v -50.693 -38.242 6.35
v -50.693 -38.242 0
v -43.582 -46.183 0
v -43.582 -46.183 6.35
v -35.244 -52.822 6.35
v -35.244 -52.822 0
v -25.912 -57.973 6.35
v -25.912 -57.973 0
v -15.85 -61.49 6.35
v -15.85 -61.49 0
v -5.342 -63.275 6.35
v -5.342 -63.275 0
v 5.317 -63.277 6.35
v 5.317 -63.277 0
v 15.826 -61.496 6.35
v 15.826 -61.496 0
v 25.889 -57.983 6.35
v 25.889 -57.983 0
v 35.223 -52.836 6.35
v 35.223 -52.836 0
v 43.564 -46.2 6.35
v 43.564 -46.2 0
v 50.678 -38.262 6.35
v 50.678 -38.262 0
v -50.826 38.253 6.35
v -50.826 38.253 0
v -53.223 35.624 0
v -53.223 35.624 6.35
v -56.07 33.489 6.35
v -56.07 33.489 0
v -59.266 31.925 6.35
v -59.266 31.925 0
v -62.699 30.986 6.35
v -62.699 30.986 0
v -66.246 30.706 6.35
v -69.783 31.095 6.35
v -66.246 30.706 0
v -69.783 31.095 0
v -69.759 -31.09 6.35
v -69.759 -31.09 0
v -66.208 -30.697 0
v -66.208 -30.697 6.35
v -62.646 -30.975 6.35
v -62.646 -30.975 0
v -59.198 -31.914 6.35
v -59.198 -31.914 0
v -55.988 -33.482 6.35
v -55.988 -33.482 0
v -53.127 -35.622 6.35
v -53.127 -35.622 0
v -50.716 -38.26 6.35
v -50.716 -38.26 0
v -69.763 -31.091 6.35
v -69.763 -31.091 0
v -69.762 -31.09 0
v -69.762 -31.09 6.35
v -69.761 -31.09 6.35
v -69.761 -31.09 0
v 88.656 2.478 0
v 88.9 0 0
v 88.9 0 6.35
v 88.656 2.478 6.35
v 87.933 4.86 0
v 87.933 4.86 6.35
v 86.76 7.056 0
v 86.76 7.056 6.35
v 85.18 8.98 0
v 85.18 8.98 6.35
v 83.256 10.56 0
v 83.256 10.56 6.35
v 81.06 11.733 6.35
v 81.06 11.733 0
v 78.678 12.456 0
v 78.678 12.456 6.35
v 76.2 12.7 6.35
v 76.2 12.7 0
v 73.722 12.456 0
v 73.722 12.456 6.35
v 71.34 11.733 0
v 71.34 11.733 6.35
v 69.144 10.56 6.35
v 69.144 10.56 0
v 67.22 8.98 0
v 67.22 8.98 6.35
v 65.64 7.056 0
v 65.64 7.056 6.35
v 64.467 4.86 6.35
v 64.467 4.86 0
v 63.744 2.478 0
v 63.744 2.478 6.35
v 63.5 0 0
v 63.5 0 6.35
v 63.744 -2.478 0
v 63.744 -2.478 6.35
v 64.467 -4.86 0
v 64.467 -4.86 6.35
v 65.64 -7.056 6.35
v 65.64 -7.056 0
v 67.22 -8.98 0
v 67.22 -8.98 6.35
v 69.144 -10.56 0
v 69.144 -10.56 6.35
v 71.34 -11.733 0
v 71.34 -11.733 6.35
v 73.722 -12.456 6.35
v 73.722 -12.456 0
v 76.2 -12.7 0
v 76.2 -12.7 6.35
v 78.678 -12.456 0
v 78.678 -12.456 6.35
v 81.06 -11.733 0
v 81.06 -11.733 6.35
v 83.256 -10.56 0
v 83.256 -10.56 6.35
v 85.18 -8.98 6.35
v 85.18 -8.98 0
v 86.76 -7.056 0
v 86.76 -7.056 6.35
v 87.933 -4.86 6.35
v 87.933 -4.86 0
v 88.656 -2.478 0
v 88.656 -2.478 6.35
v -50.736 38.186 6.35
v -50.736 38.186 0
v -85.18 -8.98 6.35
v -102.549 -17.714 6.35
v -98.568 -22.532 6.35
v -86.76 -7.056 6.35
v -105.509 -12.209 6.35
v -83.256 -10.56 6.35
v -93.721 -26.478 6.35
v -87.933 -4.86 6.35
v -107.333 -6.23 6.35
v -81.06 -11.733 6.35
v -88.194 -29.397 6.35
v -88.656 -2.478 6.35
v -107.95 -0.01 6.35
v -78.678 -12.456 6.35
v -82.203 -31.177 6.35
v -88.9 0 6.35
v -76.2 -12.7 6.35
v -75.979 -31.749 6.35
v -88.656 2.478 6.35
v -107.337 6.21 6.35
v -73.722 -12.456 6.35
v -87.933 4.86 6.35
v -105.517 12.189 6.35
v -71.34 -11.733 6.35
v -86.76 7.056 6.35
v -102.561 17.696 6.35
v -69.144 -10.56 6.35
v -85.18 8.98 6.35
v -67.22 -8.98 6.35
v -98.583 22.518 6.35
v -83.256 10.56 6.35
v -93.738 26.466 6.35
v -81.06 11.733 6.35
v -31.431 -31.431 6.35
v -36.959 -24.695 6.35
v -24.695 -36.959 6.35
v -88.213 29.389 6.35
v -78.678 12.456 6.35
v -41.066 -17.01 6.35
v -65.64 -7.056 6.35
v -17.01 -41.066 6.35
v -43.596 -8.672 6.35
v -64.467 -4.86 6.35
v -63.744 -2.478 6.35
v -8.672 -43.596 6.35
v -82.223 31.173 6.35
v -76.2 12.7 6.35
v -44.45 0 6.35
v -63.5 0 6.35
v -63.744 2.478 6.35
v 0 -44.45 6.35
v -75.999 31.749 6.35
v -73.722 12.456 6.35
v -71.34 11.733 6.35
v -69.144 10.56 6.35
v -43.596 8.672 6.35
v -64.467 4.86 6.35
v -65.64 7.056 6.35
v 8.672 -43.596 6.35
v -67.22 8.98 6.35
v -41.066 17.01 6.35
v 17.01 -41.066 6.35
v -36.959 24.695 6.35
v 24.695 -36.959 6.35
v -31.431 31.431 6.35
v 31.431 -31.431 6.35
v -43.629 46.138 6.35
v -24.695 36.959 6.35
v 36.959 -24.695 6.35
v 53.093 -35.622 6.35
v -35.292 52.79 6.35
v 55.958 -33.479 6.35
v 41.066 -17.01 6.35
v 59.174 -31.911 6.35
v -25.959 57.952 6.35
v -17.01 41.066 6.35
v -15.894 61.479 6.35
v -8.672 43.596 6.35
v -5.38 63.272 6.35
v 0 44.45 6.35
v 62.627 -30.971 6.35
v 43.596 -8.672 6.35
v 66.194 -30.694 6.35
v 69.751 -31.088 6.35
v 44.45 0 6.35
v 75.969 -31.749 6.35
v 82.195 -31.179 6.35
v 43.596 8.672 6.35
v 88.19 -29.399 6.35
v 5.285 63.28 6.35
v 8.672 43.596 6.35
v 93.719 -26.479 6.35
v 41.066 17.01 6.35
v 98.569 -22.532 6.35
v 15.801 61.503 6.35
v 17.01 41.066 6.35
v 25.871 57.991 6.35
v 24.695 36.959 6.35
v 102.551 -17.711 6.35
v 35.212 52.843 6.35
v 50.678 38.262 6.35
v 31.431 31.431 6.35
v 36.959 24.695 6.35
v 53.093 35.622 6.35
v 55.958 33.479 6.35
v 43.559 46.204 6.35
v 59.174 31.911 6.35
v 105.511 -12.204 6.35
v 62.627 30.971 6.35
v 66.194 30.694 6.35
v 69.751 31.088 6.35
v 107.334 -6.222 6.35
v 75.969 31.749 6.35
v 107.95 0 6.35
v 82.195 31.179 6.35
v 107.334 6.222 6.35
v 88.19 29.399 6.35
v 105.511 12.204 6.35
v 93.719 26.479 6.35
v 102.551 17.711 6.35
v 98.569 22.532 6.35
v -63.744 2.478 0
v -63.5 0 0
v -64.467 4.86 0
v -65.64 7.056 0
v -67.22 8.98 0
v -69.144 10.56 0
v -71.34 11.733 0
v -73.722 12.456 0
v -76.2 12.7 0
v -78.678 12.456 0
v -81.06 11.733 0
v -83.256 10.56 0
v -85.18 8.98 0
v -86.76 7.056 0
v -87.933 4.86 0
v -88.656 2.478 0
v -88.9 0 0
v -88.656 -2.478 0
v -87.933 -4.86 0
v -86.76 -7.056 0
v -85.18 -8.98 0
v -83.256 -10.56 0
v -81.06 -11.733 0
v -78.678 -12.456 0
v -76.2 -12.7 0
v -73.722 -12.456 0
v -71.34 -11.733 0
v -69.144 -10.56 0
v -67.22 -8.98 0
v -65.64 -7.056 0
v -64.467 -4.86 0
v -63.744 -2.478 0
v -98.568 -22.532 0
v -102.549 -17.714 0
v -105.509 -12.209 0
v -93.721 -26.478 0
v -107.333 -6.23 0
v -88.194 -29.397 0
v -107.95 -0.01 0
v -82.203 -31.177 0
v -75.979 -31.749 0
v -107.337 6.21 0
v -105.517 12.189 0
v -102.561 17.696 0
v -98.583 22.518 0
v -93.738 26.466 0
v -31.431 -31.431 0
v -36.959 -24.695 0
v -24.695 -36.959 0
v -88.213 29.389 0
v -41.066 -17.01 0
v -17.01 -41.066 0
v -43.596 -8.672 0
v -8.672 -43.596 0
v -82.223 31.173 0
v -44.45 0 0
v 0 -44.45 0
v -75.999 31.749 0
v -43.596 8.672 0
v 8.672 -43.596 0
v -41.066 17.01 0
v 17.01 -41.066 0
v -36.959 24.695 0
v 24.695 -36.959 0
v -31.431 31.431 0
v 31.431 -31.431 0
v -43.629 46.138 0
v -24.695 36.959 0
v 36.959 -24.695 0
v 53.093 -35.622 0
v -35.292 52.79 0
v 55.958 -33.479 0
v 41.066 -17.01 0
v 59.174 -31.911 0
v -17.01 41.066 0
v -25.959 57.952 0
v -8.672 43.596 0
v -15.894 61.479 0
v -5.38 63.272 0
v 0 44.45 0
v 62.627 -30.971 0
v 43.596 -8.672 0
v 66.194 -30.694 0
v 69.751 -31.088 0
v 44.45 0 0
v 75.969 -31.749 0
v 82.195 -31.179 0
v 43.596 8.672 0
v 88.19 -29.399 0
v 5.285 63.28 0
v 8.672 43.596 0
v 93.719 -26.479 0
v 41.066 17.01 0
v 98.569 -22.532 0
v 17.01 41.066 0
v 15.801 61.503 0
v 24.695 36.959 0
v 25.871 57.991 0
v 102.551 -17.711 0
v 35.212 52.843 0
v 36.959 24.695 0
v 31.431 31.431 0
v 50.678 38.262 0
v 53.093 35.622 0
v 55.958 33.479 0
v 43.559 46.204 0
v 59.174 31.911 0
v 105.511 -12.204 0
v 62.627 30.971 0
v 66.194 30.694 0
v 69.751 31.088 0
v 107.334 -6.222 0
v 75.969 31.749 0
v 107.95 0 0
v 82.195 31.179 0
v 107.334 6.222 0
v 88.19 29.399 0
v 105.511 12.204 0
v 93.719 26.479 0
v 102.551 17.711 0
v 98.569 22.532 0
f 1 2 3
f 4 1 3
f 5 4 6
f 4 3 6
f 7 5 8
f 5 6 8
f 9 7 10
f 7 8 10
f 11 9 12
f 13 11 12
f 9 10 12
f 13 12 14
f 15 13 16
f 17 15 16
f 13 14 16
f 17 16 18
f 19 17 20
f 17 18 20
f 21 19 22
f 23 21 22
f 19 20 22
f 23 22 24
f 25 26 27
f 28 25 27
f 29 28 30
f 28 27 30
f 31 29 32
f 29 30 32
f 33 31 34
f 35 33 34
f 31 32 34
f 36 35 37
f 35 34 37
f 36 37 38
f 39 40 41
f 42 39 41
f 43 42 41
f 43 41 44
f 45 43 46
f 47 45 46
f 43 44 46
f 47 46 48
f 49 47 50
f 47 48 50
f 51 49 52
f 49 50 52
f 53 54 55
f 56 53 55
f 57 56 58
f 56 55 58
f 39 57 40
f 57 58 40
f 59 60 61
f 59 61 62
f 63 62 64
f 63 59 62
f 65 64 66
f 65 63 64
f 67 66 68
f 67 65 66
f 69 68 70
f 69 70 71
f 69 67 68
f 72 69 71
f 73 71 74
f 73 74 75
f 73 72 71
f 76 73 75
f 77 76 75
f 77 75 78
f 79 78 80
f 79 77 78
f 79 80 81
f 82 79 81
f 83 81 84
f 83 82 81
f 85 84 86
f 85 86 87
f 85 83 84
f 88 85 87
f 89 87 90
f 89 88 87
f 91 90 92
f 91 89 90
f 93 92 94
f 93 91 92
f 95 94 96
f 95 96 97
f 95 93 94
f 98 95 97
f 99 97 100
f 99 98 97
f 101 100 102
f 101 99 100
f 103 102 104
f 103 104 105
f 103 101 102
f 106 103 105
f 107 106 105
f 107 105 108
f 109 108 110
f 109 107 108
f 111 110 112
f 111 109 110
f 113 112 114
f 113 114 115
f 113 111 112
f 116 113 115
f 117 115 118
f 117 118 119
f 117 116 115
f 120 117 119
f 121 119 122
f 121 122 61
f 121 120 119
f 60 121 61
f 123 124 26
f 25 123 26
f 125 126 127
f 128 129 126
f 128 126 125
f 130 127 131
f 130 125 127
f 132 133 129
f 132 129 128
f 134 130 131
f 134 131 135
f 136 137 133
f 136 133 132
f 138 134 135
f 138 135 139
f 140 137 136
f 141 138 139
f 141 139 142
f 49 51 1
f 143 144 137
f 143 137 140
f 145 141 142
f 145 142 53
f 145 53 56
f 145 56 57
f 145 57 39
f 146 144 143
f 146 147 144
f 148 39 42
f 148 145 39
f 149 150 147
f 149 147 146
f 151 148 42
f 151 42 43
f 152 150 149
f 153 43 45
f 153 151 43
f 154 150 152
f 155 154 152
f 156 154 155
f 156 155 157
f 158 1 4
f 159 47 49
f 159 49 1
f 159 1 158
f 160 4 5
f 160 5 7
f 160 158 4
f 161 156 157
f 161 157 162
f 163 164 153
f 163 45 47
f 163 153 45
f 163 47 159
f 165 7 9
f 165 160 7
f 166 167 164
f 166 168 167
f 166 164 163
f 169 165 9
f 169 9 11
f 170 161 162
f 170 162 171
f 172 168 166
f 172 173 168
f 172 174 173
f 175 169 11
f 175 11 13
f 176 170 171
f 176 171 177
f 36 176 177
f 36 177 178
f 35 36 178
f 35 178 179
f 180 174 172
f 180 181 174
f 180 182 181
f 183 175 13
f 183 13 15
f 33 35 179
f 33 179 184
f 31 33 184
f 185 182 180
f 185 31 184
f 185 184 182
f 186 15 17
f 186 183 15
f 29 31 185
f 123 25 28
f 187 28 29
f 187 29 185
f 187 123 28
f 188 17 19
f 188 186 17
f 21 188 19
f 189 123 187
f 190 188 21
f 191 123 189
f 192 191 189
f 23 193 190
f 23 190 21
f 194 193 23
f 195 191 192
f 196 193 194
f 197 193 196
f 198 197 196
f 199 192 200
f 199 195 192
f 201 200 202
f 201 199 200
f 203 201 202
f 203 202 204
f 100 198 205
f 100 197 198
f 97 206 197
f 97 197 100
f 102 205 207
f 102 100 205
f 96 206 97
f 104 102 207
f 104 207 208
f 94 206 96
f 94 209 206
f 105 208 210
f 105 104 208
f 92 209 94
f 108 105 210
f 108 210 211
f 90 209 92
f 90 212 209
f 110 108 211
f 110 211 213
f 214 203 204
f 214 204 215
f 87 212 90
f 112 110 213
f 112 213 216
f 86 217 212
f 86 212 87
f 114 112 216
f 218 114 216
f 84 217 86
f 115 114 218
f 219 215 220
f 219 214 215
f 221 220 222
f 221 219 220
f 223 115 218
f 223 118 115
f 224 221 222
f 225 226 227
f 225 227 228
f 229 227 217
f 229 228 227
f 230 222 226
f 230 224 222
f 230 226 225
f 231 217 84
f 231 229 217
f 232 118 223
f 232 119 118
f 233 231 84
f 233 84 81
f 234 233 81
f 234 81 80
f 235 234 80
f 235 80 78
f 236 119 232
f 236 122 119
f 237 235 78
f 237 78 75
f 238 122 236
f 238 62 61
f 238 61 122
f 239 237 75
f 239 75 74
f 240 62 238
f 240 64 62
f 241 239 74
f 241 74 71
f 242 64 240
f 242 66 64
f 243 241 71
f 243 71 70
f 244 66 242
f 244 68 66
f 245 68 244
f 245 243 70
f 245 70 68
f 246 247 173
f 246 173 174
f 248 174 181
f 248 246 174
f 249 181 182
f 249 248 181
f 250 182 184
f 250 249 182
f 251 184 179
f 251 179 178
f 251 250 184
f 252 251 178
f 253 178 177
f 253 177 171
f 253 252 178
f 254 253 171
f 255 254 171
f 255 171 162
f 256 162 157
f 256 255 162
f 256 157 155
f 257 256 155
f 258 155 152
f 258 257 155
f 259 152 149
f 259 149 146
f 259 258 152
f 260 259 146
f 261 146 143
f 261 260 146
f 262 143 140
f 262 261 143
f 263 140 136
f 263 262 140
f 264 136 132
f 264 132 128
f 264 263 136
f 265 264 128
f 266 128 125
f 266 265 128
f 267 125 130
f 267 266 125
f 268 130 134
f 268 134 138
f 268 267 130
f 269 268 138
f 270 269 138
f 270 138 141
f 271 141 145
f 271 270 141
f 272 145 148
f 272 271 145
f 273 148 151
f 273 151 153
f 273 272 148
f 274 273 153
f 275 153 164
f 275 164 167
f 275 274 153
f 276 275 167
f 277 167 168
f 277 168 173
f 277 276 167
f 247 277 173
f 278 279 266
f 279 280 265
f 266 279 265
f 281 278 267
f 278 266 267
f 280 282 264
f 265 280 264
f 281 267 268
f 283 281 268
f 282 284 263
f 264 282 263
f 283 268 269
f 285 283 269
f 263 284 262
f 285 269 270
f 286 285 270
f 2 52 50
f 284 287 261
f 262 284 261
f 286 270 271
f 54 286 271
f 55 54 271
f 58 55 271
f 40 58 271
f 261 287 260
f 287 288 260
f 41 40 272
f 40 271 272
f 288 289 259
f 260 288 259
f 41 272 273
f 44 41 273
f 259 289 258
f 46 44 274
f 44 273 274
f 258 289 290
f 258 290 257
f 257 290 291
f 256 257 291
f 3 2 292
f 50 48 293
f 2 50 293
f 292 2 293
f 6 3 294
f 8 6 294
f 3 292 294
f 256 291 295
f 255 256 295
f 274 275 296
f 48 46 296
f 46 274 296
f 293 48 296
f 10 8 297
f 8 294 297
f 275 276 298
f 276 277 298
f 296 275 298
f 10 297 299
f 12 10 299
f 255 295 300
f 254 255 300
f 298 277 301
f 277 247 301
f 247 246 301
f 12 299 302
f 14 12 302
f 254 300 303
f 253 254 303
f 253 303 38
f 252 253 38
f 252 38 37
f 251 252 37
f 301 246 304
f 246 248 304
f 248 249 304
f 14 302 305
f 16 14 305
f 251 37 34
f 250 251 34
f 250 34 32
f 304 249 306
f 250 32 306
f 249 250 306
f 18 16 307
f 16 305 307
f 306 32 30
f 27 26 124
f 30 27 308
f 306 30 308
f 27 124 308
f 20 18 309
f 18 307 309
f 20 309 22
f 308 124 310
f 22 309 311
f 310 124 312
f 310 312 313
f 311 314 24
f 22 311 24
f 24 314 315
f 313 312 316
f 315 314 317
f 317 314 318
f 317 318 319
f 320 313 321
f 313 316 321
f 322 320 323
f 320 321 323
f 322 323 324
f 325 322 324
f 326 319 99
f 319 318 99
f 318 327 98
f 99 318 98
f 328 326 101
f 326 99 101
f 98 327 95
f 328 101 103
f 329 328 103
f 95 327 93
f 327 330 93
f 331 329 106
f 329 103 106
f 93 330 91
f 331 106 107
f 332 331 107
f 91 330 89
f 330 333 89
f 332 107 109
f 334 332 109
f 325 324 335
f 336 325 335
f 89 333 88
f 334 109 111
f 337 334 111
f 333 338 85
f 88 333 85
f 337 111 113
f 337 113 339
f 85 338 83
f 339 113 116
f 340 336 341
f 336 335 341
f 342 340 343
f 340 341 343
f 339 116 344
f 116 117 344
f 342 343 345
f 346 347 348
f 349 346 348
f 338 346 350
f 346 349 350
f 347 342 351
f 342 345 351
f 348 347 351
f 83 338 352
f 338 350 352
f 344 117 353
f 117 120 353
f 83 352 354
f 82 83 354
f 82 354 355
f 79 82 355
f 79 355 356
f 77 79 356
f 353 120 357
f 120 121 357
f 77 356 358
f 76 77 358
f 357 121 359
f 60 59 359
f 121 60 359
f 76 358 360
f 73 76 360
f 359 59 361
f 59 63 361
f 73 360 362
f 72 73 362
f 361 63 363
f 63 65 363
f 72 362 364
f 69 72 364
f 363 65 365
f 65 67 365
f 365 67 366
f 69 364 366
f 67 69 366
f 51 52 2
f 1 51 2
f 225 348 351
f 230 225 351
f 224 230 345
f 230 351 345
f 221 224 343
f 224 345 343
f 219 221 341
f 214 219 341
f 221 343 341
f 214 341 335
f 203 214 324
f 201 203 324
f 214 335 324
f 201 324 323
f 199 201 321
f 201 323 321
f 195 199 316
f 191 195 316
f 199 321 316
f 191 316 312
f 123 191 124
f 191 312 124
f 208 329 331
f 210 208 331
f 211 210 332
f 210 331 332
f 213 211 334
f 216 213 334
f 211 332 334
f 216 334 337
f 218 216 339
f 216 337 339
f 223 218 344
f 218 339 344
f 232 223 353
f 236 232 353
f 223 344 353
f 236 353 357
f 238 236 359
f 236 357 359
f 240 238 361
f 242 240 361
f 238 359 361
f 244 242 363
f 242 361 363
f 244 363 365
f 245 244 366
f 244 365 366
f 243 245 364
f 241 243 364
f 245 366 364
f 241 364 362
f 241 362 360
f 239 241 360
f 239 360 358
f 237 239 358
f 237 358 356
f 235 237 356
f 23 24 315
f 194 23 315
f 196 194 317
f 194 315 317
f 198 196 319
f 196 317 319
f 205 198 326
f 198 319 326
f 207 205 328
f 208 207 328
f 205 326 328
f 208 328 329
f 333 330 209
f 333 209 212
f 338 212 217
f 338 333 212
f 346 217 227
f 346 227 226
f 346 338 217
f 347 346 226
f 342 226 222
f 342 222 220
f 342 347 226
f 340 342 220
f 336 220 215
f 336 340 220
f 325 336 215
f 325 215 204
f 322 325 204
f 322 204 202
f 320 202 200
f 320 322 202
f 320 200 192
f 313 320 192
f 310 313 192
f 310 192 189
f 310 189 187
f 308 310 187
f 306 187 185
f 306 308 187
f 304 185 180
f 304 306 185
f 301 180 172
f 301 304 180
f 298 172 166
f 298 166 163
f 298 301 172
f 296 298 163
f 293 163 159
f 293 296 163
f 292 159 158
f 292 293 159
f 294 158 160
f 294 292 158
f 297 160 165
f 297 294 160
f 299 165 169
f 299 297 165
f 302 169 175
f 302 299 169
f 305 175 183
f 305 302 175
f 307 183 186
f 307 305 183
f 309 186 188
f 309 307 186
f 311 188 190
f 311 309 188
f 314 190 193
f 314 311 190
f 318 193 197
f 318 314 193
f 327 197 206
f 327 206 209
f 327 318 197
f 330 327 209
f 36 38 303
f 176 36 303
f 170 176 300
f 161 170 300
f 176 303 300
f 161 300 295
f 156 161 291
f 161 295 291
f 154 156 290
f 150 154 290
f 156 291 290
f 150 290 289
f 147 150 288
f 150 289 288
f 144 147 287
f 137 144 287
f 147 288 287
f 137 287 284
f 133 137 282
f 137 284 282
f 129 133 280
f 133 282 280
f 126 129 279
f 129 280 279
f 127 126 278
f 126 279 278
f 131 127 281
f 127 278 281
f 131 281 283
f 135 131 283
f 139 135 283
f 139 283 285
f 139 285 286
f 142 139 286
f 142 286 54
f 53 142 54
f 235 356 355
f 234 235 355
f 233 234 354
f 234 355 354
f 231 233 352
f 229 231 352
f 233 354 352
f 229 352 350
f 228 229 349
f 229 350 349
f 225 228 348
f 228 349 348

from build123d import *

# Parameters (mm, degrees)
F0_R     = 12.7
F0_R_2   = 44.45
F1_DEPTH = 6.35


with BuildPart() as f1:
    # F0 (on Top) → F1 (new body)
    with BuildSketch(Plane.XY):
        with BuildLine():
            ThreePointArc((-50.825601, 38.253471), (-59.266449, 31.925086), (-69.783439, 31.094859))
            ThreePointArc((-69.783439, 31.094859), (-107.949998, -0.010447), (-69.762979, -31.09063))
            ThreePointArc((-69.762979, -31.09063), (-69.761122, -31.090245), (-69.759266, -31.089861))
            ThreePointArc((-69.759266, -31.089861), (-59.198353, -31.914391), (-50.716273, -38.260023))
            Line((-50.716273, -38.260023), (-50.692897, -38.242388))
            ThreePointArc((-50.692897, -38.242388), (-0.01246, -63.499999), (50.677885, -38.262279))
            ThreePointArc((50.677885, -38.262279), (59.174451, -31.910614), (69.750781, -31.088102))
            ThreePointArc((69.750781, -31.088102), (107.95, 0), (69.750781, 31.088102))
            ThreePointArc((69.750781, 31.088102), (59.174451, 31.910614), (50.677885, 38.262279))
            ThreePointArc((50.677885, 38.262279), (-0.047933, 63.499982), (-50.735592, 38.185726))
            Line((-50.735592, 38.185726), (-50.825601, 38.253471))
        make_face()
        with Locations((-76.2, 0)):
            Circle(F0_R, mode=Mode.SUBTRACT)
        Circle(F0_R_2, mode=Mode.SUBTRACT)
        with Locations((76.2, 0)):
            Circle(F0_R, mode=Mode.SUBTRACT)
    extrude(amount=F1_DEPTH)


solid = f1.part
